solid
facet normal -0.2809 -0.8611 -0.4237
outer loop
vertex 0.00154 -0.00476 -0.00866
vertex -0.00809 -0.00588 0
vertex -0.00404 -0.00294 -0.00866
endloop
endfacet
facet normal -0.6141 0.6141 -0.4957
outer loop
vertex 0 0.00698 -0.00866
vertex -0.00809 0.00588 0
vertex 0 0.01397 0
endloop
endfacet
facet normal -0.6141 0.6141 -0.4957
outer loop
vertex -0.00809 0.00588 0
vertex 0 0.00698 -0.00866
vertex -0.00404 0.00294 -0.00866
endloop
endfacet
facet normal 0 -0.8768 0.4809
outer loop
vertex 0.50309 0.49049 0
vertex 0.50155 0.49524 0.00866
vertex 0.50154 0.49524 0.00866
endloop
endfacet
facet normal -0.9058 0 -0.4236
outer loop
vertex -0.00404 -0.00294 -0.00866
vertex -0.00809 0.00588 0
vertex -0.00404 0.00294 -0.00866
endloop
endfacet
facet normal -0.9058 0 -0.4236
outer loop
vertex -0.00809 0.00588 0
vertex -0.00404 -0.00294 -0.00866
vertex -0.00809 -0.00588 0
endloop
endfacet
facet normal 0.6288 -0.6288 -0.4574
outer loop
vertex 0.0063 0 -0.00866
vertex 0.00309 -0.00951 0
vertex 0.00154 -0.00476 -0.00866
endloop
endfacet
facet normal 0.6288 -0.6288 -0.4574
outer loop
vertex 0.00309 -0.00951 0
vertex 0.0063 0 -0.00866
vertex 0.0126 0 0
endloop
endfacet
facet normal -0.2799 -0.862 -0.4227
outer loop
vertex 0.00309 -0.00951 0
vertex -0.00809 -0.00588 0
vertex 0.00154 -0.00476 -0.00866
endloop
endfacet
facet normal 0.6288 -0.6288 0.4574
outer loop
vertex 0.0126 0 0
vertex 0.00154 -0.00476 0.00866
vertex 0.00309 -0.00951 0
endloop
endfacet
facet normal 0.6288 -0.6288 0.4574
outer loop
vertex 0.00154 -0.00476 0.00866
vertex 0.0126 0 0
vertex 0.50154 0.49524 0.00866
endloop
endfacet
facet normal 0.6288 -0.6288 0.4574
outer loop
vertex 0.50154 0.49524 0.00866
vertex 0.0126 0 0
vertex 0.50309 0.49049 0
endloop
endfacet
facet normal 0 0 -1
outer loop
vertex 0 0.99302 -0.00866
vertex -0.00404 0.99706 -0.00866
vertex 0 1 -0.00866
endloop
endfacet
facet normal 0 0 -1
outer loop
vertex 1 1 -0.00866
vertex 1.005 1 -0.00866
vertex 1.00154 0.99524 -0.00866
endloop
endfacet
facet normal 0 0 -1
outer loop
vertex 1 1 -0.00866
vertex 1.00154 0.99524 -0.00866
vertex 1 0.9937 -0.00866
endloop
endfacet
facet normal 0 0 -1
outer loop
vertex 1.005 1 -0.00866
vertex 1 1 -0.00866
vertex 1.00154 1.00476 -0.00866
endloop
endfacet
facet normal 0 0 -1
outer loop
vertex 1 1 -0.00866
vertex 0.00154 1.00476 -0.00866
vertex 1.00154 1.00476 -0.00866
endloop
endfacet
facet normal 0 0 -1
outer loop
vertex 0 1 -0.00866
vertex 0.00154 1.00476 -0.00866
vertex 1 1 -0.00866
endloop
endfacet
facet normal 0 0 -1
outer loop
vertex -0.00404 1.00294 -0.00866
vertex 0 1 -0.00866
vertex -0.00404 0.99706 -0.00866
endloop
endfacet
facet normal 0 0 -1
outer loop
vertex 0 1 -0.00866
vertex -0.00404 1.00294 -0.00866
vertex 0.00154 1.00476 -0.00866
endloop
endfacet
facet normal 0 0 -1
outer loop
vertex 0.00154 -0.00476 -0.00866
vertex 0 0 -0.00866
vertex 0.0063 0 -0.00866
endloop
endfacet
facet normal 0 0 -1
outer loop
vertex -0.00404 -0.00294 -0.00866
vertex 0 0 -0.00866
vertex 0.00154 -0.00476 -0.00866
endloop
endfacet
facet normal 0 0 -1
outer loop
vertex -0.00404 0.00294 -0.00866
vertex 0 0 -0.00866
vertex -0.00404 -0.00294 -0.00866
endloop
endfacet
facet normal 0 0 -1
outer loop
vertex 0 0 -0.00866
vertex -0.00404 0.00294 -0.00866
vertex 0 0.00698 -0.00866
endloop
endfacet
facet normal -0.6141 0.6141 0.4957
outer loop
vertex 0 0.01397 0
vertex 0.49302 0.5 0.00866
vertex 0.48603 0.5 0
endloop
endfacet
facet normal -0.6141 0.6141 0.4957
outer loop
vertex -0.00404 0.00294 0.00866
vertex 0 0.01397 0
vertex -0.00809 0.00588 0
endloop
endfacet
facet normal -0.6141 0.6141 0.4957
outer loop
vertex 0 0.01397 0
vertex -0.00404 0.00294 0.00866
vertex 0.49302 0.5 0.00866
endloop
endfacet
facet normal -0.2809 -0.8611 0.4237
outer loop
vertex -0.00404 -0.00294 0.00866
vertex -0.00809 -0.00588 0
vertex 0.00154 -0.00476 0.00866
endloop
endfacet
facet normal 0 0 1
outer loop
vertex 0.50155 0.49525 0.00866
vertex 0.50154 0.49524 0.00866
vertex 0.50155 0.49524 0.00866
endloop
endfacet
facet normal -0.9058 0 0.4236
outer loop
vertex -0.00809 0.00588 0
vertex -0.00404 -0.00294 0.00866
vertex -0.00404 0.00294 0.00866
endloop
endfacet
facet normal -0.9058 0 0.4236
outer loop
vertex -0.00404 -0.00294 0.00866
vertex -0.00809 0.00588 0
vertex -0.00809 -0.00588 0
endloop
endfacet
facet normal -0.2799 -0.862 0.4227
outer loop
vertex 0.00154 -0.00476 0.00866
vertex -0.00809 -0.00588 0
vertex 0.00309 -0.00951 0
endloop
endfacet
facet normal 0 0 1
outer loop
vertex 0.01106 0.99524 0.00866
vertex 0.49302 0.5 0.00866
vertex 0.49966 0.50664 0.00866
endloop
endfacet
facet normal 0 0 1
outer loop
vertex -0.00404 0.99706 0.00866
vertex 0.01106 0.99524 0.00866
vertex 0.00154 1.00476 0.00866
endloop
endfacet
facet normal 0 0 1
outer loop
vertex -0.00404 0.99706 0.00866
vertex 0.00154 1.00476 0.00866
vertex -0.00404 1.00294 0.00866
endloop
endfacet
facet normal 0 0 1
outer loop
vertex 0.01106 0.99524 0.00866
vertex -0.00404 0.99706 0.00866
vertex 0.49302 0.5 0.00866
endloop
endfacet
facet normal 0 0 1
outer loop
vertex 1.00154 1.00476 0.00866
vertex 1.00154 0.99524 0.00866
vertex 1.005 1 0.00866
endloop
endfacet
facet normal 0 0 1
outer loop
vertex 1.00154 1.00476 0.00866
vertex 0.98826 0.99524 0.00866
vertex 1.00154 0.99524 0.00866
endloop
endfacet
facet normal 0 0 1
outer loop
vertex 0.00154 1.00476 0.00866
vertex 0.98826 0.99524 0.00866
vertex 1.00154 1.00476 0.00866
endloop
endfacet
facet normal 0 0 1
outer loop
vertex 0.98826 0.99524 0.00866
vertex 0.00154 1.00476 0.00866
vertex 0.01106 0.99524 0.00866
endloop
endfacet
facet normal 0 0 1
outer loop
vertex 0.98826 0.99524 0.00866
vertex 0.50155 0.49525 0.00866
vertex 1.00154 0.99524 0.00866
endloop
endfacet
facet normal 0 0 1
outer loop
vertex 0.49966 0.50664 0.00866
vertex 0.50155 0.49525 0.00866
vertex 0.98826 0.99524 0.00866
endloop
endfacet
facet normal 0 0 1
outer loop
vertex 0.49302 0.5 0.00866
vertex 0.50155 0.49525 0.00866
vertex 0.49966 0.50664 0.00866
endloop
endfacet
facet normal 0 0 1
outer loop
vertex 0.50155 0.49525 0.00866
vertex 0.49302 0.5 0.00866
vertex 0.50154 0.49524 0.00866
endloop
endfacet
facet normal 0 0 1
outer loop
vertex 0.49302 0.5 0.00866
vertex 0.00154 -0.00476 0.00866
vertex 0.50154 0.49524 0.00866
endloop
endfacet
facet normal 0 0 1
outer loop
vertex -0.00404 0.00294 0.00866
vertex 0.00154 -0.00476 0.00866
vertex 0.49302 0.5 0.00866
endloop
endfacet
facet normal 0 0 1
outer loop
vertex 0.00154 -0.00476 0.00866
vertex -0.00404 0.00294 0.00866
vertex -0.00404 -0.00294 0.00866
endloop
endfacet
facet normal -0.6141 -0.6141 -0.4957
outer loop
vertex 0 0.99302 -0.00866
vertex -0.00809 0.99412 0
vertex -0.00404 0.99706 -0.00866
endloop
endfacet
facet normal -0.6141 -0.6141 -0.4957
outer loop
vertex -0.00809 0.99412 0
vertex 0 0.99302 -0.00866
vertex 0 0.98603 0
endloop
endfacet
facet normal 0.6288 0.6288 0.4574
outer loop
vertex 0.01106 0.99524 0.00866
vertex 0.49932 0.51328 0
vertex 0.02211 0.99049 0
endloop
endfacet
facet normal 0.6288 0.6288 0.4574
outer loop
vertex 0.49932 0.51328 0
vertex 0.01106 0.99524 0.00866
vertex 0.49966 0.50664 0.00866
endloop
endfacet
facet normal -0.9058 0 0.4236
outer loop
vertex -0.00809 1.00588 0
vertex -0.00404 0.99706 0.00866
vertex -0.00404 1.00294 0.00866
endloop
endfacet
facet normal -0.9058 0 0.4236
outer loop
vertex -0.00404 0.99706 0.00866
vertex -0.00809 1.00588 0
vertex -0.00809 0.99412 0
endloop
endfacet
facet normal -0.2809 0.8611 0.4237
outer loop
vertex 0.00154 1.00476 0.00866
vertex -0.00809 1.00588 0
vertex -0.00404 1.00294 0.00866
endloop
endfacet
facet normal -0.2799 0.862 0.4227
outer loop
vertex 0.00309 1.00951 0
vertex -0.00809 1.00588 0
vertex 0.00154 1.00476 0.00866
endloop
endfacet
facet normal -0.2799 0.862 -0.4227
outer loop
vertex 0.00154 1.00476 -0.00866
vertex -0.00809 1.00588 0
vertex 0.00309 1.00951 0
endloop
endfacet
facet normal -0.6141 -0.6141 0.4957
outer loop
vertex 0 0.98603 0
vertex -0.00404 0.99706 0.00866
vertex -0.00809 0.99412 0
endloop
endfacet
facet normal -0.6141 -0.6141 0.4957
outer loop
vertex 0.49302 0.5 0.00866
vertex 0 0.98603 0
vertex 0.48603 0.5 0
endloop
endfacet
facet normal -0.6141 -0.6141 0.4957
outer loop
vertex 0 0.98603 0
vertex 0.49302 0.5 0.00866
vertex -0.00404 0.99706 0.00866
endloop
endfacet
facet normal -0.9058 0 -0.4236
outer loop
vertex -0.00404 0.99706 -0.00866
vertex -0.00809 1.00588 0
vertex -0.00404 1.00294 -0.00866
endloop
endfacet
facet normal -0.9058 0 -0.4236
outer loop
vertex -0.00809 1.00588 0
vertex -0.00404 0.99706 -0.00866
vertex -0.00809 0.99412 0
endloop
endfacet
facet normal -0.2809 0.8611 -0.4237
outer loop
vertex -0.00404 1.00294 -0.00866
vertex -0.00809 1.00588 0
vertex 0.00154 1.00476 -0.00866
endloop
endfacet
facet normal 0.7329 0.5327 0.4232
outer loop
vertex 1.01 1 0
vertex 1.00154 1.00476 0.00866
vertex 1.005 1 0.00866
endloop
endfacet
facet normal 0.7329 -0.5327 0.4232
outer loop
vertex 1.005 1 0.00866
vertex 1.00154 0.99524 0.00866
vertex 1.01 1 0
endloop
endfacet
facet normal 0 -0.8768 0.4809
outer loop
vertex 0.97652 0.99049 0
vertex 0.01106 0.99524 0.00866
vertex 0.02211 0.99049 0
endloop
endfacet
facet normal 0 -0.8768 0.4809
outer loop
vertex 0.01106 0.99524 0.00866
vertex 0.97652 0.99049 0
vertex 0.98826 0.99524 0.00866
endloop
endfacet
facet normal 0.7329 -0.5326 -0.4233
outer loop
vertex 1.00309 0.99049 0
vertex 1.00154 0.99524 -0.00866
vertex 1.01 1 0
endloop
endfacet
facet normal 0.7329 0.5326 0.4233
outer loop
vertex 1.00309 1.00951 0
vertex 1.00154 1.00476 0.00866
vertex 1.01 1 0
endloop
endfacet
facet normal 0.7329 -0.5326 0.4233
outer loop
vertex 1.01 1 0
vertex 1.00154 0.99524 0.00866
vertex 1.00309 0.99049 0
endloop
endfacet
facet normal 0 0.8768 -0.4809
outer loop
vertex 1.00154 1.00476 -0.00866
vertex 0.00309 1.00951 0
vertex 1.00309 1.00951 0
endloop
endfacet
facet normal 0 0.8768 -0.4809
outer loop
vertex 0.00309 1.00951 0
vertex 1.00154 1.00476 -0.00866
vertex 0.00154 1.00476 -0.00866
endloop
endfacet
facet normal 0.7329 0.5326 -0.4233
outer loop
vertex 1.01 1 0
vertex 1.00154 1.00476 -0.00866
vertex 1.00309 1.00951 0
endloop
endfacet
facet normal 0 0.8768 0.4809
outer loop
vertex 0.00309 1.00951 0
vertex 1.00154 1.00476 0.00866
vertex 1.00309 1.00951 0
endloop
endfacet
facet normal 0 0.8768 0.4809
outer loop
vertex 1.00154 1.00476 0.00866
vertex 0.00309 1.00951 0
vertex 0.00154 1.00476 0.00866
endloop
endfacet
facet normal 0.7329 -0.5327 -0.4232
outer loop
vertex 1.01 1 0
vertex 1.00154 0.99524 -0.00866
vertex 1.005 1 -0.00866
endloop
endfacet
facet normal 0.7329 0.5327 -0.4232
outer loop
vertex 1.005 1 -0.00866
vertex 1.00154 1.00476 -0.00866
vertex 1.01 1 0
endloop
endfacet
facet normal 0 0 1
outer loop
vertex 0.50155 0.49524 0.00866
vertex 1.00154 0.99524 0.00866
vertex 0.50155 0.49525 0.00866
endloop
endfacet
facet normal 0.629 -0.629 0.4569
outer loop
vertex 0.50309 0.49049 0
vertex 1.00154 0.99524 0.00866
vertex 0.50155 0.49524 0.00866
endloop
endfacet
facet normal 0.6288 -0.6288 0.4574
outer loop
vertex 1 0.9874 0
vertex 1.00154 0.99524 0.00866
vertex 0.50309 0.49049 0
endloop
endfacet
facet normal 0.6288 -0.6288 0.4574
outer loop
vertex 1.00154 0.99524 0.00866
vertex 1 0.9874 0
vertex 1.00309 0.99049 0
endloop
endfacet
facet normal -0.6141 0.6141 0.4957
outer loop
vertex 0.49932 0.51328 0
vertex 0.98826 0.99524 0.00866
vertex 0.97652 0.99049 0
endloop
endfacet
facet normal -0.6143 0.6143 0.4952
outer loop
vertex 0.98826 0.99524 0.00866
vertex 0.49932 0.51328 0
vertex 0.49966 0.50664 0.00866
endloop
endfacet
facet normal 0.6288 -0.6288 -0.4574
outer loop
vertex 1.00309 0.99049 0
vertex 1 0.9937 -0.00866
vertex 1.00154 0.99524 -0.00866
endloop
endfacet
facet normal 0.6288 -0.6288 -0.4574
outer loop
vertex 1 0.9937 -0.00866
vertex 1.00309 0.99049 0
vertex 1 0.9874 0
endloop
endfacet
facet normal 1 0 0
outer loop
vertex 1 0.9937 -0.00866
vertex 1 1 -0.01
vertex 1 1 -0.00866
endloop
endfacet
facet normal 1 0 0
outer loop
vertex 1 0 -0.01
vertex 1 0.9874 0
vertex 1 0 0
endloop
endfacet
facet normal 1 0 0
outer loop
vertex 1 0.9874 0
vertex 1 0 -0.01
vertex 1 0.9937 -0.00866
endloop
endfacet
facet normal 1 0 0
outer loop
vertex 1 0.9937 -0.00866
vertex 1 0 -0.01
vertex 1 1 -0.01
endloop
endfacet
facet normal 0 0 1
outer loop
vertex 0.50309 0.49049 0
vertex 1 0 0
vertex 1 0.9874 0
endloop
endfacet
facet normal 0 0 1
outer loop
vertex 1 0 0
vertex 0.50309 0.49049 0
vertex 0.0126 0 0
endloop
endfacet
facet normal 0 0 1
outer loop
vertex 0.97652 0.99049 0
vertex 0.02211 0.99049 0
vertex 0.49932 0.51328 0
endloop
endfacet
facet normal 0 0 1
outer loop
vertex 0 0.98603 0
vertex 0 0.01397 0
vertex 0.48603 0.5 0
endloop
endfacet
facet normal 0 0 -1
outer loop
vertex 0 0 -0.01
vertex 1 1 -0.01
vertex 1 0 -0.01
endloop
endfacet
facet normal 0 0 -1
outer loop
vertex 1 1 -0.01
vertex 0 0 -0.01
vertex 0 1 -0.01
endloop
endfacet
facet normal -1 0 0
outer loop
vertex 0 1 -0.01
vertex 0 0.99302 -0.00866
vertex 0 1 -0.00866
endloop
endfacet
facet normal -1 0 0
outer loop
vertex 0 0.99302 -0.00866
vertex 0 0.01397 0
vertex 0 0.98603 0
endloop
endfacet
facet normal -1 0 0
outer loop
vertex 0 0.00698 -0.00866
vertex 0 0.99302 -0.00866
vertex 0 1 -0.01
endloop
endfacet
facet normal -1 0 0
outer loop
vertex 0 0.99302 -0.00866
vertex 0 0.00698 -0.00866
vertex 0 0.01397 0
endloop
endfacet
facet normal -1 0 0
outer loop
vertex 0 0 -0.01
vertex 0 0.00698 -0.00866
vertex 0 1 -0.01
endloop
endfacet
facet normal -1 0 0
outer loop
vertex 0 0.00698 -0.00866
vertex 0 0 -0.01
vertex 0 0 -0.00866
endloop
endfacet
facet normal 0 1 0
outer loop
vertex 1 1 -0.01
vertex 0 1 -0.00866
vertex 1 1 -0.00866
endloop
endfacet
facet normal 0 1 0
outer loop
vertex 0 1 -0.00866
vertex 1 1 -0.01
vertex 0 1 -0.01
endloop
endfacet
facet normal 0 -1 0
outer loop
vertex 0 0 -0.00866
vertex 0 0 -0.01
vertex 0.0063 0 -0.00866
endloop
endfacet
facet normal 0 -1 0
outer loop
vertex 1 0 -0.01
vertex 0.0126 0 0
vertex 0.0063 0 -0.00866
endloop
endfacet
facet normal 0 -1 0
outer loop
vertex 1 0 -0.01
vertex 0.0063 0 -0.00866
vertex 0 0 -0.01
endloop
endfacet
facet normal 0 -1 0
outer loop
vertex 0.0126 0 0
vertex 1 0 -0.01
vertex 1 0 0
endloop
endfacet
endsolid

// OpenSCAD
hull(){
    translate([0.0, 0.0]) sphere(0.01);
    translate([0.5, 0.5]) sphere(0.01);
}
hull(){
    translate([0.5, 0.5]) sphere(0.01);
    translate([0.0, 1.0]) sphere(0.01);
}
hull(){
    translate([0.0, 1.0]) sphere(0.01);
    translate([1.0, 1.0]) sphere(0.01);
}
hull(){
    translate([1.0, 1.0]) sphere(0.01);
    translate([0.0, 0.0]) sphere(0.01);
}
translate([0,0,-0.01]) color([0.1,0.1,0.1]) cube([1,1,0.01]);
